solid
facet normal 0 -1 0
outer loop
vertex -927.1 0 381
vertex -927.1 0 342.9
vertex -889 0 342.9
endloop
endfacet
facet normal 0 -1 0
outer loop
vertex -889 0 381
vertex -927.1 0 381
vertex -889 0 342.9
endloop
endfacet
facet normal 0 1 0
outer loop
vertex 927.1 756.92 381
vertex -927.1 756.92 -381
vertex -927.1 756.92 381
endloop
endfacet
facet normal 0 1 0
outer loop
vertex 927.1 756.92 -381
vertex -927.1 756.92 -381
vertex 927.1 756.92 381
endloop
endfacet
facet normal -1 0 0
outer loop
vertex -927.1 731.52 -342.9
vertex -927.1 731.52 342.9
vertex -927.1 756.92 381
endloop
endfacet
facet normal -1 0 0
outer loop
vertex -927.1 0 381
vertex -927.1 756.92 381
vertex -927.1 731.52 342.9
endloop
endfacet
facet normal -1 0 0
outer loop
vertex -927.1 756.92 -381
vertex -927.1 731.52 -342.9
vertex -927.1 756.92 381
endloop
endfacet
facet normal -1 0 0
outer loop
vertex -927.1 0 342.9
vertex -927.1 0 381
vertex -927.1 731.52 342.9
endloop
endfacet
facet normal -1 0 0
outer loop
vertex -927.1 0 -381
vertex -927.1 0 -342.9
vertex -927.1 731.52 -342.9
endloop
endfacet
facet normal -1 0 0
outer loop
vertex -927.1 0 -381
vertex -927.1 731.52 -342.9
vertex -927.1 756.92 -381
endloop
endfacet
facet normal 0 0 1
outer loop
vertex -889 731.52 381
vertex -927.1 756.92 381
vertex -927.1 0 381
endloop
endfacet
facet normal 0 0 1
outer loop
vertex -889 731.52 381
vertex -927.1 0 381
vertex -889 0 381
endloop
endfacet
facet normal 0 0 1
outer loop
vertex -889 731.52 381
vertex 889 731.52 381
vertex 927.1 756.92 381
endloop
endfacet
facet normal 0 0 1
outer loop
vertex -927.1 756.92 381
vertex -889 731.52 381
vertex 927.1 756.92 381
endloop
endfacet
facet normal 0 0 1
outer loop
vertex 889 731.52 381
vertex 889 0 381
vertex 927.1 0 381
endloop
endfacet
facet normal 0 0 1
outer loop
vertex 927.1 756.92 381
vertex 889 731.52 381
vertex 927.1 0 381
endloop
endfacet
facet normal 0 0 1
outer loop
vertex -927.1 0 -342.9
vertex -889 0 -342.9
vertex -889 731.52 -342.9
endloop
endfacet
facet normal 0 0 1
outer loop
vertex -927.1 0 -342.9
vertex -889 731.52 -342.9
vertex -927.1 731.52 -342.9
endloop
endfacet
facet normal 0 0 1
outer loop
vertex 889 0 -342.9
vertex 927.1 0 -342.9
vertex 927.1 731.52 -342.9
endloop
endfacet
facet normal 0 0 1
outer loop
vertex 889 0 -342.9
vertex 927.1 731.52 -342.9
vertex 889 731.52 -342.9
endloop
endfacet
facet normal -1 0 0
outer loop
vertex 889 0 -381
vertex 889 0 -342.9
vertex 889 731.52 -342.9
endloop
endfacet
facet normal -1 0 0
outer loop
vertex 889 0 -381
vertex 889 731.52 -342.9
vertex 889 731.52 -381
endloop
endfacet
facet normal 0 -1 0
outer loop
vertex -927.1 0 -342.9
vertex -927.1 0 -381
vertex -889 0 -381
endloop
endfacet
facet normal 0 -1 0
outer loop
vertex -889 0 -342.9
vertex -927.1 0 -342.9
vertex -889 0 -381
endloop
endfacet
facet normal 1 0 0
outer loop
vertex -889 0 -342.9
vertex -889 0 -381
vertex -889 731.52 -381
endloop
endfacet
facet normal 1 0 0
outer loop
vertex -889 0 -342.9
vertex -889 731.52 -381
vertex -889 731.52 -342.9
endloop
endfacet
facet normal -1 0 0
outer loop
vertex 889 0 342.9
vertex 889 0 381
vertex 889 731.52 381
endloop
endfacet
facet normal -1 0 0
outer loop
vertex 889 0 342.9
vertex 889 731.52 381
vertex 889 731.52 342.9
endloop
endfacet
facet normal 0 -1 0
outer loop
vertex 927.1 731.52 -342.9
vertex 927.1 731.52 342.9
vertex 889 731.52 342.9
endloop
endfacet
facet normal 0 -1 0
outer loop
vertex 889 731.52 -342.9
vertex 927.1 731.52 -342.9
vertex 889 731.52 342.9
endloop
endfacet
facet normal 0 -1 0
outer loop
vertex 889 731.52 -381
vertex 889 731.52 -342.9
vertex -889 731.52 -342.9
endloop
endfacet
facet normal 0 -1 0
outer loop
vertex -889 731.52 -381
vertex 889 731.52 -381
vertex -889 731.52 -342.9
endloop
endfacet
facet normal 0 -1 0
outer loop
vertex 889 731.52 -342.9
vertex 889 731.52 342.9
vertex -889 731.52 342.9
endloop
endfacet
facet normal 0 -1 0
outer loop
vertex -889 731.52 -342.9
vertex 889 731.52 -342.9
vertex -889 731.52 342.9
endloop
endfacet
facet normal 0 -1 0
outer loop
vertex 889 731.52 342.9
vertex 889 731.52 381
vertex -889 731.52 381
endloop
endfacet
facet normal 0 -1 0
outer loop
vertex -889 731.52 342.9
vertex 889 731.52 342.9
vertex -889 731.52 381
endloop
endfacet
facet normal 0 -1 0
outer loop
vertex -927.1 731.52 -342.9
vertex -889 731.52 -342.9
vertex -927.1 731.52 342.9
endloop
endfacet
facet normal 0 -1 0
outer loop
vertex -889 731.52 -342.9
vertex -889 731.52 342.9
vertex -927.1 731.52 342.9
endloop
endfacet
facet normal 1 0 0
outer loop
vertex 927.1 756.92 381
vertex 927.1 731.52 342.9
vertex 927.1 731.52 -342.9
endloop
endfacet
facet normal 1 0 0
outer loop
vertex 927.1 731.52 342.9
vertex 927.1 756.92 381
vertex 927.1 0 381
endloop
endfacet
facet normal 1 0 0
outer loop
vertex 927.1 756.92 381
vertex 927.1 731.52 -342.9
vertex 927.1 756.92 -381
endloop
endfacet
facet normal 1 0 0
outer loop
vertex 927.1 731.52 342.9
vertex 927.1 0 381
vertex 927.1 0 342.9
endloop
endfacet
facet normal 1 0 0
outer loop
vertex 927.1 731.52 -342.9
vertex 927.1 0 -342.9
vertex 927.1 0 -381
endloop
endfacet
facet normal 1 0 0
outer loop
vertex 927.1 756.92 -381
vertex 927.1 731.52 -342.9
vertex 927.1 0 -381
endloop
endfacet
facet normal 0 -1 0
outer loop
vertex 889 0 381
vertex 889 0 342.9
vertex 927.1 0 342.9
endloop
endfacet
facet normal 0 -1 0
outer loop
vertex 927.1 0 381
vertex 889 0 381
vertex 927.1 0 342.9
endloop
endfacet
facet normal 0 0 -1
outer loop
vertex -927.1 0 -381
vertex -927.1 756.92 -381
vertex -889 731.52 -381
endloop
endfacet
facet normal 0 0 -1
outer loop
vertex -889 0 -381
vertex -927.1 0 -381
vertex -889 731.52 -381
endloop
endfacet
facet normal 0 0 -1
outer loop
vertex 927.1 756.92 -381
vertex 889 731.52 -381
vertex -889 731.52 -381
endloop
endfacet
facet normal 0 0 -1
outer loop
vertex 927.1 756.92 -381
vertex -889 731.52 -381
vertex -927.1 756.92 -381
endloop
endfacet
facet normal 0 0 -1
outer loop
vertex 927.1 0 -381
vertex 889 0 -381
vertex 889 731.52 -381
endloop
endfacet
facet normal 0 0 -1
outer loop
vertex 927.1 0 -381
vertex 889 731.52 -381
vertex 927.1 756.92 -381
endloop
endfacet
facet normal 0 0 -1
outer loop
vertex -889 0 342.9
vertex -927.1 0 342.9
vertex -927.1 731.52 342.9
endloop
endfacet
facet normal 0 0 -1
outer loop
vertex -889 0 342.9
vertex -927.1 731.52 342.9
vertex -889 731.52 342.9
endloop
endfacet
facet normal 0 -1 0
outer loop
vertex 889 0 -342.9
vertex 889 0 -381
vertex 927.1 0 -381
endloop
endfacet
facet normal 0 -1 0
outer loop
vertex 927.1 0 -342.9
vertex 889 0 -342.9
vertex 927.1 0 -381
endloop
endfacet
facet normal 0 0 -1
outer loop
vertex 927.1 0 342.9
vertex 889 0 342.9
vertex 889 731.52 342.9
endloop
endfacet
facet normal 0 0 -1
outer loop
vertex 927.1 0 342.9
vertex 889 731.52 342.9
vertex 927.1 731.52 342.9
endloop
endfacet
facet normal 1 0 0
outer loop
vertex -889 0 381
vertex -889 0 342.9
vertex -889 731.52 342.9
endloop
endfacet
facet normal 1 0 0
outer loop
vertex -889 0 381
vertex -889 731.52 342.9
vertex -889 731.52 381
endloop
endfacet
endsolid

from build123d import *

# Parameters (mm, degrees)
SKETCH1_W           = 1854.2
SKETCH1_H           = 762
BOSS_EXTRUDE1_DEPTH = 756.92
CUT_EXTRUDE1_DEPTH  = 731.52


with BuildPart() as part:
    # Sketch1 → Boss-Extrude1 (new body)
    with BuildSketch(Plane(origin=(0, 0, 0), x_dir=(1, 0, 0), z_dir=(0, 1, 0))):
        Rectangle(SKETCH1_W, SKETCH1_H)
    extrude(amount=BOSS_EXTRUDE1_DEPTH)

    # Sketch2 → Cut-Extrude1 (cut)
    with BuildSketch(Plane.XZ):
        Polygon((-889, 381), (889, 381), (889, 342.9), (927.1, 342.9), (927.1, -342.9), (889, -342.9), (889, -381), (-889, -381), (-889, -342.9), (-927.1, -342.9), (-927.1, 342.9), (-889, 342.9), align=None)
    extrude(amount=-CUT_EXTRUDE1_DEPTH, mode=Mode.SUBTRACT)


solid = part.part
